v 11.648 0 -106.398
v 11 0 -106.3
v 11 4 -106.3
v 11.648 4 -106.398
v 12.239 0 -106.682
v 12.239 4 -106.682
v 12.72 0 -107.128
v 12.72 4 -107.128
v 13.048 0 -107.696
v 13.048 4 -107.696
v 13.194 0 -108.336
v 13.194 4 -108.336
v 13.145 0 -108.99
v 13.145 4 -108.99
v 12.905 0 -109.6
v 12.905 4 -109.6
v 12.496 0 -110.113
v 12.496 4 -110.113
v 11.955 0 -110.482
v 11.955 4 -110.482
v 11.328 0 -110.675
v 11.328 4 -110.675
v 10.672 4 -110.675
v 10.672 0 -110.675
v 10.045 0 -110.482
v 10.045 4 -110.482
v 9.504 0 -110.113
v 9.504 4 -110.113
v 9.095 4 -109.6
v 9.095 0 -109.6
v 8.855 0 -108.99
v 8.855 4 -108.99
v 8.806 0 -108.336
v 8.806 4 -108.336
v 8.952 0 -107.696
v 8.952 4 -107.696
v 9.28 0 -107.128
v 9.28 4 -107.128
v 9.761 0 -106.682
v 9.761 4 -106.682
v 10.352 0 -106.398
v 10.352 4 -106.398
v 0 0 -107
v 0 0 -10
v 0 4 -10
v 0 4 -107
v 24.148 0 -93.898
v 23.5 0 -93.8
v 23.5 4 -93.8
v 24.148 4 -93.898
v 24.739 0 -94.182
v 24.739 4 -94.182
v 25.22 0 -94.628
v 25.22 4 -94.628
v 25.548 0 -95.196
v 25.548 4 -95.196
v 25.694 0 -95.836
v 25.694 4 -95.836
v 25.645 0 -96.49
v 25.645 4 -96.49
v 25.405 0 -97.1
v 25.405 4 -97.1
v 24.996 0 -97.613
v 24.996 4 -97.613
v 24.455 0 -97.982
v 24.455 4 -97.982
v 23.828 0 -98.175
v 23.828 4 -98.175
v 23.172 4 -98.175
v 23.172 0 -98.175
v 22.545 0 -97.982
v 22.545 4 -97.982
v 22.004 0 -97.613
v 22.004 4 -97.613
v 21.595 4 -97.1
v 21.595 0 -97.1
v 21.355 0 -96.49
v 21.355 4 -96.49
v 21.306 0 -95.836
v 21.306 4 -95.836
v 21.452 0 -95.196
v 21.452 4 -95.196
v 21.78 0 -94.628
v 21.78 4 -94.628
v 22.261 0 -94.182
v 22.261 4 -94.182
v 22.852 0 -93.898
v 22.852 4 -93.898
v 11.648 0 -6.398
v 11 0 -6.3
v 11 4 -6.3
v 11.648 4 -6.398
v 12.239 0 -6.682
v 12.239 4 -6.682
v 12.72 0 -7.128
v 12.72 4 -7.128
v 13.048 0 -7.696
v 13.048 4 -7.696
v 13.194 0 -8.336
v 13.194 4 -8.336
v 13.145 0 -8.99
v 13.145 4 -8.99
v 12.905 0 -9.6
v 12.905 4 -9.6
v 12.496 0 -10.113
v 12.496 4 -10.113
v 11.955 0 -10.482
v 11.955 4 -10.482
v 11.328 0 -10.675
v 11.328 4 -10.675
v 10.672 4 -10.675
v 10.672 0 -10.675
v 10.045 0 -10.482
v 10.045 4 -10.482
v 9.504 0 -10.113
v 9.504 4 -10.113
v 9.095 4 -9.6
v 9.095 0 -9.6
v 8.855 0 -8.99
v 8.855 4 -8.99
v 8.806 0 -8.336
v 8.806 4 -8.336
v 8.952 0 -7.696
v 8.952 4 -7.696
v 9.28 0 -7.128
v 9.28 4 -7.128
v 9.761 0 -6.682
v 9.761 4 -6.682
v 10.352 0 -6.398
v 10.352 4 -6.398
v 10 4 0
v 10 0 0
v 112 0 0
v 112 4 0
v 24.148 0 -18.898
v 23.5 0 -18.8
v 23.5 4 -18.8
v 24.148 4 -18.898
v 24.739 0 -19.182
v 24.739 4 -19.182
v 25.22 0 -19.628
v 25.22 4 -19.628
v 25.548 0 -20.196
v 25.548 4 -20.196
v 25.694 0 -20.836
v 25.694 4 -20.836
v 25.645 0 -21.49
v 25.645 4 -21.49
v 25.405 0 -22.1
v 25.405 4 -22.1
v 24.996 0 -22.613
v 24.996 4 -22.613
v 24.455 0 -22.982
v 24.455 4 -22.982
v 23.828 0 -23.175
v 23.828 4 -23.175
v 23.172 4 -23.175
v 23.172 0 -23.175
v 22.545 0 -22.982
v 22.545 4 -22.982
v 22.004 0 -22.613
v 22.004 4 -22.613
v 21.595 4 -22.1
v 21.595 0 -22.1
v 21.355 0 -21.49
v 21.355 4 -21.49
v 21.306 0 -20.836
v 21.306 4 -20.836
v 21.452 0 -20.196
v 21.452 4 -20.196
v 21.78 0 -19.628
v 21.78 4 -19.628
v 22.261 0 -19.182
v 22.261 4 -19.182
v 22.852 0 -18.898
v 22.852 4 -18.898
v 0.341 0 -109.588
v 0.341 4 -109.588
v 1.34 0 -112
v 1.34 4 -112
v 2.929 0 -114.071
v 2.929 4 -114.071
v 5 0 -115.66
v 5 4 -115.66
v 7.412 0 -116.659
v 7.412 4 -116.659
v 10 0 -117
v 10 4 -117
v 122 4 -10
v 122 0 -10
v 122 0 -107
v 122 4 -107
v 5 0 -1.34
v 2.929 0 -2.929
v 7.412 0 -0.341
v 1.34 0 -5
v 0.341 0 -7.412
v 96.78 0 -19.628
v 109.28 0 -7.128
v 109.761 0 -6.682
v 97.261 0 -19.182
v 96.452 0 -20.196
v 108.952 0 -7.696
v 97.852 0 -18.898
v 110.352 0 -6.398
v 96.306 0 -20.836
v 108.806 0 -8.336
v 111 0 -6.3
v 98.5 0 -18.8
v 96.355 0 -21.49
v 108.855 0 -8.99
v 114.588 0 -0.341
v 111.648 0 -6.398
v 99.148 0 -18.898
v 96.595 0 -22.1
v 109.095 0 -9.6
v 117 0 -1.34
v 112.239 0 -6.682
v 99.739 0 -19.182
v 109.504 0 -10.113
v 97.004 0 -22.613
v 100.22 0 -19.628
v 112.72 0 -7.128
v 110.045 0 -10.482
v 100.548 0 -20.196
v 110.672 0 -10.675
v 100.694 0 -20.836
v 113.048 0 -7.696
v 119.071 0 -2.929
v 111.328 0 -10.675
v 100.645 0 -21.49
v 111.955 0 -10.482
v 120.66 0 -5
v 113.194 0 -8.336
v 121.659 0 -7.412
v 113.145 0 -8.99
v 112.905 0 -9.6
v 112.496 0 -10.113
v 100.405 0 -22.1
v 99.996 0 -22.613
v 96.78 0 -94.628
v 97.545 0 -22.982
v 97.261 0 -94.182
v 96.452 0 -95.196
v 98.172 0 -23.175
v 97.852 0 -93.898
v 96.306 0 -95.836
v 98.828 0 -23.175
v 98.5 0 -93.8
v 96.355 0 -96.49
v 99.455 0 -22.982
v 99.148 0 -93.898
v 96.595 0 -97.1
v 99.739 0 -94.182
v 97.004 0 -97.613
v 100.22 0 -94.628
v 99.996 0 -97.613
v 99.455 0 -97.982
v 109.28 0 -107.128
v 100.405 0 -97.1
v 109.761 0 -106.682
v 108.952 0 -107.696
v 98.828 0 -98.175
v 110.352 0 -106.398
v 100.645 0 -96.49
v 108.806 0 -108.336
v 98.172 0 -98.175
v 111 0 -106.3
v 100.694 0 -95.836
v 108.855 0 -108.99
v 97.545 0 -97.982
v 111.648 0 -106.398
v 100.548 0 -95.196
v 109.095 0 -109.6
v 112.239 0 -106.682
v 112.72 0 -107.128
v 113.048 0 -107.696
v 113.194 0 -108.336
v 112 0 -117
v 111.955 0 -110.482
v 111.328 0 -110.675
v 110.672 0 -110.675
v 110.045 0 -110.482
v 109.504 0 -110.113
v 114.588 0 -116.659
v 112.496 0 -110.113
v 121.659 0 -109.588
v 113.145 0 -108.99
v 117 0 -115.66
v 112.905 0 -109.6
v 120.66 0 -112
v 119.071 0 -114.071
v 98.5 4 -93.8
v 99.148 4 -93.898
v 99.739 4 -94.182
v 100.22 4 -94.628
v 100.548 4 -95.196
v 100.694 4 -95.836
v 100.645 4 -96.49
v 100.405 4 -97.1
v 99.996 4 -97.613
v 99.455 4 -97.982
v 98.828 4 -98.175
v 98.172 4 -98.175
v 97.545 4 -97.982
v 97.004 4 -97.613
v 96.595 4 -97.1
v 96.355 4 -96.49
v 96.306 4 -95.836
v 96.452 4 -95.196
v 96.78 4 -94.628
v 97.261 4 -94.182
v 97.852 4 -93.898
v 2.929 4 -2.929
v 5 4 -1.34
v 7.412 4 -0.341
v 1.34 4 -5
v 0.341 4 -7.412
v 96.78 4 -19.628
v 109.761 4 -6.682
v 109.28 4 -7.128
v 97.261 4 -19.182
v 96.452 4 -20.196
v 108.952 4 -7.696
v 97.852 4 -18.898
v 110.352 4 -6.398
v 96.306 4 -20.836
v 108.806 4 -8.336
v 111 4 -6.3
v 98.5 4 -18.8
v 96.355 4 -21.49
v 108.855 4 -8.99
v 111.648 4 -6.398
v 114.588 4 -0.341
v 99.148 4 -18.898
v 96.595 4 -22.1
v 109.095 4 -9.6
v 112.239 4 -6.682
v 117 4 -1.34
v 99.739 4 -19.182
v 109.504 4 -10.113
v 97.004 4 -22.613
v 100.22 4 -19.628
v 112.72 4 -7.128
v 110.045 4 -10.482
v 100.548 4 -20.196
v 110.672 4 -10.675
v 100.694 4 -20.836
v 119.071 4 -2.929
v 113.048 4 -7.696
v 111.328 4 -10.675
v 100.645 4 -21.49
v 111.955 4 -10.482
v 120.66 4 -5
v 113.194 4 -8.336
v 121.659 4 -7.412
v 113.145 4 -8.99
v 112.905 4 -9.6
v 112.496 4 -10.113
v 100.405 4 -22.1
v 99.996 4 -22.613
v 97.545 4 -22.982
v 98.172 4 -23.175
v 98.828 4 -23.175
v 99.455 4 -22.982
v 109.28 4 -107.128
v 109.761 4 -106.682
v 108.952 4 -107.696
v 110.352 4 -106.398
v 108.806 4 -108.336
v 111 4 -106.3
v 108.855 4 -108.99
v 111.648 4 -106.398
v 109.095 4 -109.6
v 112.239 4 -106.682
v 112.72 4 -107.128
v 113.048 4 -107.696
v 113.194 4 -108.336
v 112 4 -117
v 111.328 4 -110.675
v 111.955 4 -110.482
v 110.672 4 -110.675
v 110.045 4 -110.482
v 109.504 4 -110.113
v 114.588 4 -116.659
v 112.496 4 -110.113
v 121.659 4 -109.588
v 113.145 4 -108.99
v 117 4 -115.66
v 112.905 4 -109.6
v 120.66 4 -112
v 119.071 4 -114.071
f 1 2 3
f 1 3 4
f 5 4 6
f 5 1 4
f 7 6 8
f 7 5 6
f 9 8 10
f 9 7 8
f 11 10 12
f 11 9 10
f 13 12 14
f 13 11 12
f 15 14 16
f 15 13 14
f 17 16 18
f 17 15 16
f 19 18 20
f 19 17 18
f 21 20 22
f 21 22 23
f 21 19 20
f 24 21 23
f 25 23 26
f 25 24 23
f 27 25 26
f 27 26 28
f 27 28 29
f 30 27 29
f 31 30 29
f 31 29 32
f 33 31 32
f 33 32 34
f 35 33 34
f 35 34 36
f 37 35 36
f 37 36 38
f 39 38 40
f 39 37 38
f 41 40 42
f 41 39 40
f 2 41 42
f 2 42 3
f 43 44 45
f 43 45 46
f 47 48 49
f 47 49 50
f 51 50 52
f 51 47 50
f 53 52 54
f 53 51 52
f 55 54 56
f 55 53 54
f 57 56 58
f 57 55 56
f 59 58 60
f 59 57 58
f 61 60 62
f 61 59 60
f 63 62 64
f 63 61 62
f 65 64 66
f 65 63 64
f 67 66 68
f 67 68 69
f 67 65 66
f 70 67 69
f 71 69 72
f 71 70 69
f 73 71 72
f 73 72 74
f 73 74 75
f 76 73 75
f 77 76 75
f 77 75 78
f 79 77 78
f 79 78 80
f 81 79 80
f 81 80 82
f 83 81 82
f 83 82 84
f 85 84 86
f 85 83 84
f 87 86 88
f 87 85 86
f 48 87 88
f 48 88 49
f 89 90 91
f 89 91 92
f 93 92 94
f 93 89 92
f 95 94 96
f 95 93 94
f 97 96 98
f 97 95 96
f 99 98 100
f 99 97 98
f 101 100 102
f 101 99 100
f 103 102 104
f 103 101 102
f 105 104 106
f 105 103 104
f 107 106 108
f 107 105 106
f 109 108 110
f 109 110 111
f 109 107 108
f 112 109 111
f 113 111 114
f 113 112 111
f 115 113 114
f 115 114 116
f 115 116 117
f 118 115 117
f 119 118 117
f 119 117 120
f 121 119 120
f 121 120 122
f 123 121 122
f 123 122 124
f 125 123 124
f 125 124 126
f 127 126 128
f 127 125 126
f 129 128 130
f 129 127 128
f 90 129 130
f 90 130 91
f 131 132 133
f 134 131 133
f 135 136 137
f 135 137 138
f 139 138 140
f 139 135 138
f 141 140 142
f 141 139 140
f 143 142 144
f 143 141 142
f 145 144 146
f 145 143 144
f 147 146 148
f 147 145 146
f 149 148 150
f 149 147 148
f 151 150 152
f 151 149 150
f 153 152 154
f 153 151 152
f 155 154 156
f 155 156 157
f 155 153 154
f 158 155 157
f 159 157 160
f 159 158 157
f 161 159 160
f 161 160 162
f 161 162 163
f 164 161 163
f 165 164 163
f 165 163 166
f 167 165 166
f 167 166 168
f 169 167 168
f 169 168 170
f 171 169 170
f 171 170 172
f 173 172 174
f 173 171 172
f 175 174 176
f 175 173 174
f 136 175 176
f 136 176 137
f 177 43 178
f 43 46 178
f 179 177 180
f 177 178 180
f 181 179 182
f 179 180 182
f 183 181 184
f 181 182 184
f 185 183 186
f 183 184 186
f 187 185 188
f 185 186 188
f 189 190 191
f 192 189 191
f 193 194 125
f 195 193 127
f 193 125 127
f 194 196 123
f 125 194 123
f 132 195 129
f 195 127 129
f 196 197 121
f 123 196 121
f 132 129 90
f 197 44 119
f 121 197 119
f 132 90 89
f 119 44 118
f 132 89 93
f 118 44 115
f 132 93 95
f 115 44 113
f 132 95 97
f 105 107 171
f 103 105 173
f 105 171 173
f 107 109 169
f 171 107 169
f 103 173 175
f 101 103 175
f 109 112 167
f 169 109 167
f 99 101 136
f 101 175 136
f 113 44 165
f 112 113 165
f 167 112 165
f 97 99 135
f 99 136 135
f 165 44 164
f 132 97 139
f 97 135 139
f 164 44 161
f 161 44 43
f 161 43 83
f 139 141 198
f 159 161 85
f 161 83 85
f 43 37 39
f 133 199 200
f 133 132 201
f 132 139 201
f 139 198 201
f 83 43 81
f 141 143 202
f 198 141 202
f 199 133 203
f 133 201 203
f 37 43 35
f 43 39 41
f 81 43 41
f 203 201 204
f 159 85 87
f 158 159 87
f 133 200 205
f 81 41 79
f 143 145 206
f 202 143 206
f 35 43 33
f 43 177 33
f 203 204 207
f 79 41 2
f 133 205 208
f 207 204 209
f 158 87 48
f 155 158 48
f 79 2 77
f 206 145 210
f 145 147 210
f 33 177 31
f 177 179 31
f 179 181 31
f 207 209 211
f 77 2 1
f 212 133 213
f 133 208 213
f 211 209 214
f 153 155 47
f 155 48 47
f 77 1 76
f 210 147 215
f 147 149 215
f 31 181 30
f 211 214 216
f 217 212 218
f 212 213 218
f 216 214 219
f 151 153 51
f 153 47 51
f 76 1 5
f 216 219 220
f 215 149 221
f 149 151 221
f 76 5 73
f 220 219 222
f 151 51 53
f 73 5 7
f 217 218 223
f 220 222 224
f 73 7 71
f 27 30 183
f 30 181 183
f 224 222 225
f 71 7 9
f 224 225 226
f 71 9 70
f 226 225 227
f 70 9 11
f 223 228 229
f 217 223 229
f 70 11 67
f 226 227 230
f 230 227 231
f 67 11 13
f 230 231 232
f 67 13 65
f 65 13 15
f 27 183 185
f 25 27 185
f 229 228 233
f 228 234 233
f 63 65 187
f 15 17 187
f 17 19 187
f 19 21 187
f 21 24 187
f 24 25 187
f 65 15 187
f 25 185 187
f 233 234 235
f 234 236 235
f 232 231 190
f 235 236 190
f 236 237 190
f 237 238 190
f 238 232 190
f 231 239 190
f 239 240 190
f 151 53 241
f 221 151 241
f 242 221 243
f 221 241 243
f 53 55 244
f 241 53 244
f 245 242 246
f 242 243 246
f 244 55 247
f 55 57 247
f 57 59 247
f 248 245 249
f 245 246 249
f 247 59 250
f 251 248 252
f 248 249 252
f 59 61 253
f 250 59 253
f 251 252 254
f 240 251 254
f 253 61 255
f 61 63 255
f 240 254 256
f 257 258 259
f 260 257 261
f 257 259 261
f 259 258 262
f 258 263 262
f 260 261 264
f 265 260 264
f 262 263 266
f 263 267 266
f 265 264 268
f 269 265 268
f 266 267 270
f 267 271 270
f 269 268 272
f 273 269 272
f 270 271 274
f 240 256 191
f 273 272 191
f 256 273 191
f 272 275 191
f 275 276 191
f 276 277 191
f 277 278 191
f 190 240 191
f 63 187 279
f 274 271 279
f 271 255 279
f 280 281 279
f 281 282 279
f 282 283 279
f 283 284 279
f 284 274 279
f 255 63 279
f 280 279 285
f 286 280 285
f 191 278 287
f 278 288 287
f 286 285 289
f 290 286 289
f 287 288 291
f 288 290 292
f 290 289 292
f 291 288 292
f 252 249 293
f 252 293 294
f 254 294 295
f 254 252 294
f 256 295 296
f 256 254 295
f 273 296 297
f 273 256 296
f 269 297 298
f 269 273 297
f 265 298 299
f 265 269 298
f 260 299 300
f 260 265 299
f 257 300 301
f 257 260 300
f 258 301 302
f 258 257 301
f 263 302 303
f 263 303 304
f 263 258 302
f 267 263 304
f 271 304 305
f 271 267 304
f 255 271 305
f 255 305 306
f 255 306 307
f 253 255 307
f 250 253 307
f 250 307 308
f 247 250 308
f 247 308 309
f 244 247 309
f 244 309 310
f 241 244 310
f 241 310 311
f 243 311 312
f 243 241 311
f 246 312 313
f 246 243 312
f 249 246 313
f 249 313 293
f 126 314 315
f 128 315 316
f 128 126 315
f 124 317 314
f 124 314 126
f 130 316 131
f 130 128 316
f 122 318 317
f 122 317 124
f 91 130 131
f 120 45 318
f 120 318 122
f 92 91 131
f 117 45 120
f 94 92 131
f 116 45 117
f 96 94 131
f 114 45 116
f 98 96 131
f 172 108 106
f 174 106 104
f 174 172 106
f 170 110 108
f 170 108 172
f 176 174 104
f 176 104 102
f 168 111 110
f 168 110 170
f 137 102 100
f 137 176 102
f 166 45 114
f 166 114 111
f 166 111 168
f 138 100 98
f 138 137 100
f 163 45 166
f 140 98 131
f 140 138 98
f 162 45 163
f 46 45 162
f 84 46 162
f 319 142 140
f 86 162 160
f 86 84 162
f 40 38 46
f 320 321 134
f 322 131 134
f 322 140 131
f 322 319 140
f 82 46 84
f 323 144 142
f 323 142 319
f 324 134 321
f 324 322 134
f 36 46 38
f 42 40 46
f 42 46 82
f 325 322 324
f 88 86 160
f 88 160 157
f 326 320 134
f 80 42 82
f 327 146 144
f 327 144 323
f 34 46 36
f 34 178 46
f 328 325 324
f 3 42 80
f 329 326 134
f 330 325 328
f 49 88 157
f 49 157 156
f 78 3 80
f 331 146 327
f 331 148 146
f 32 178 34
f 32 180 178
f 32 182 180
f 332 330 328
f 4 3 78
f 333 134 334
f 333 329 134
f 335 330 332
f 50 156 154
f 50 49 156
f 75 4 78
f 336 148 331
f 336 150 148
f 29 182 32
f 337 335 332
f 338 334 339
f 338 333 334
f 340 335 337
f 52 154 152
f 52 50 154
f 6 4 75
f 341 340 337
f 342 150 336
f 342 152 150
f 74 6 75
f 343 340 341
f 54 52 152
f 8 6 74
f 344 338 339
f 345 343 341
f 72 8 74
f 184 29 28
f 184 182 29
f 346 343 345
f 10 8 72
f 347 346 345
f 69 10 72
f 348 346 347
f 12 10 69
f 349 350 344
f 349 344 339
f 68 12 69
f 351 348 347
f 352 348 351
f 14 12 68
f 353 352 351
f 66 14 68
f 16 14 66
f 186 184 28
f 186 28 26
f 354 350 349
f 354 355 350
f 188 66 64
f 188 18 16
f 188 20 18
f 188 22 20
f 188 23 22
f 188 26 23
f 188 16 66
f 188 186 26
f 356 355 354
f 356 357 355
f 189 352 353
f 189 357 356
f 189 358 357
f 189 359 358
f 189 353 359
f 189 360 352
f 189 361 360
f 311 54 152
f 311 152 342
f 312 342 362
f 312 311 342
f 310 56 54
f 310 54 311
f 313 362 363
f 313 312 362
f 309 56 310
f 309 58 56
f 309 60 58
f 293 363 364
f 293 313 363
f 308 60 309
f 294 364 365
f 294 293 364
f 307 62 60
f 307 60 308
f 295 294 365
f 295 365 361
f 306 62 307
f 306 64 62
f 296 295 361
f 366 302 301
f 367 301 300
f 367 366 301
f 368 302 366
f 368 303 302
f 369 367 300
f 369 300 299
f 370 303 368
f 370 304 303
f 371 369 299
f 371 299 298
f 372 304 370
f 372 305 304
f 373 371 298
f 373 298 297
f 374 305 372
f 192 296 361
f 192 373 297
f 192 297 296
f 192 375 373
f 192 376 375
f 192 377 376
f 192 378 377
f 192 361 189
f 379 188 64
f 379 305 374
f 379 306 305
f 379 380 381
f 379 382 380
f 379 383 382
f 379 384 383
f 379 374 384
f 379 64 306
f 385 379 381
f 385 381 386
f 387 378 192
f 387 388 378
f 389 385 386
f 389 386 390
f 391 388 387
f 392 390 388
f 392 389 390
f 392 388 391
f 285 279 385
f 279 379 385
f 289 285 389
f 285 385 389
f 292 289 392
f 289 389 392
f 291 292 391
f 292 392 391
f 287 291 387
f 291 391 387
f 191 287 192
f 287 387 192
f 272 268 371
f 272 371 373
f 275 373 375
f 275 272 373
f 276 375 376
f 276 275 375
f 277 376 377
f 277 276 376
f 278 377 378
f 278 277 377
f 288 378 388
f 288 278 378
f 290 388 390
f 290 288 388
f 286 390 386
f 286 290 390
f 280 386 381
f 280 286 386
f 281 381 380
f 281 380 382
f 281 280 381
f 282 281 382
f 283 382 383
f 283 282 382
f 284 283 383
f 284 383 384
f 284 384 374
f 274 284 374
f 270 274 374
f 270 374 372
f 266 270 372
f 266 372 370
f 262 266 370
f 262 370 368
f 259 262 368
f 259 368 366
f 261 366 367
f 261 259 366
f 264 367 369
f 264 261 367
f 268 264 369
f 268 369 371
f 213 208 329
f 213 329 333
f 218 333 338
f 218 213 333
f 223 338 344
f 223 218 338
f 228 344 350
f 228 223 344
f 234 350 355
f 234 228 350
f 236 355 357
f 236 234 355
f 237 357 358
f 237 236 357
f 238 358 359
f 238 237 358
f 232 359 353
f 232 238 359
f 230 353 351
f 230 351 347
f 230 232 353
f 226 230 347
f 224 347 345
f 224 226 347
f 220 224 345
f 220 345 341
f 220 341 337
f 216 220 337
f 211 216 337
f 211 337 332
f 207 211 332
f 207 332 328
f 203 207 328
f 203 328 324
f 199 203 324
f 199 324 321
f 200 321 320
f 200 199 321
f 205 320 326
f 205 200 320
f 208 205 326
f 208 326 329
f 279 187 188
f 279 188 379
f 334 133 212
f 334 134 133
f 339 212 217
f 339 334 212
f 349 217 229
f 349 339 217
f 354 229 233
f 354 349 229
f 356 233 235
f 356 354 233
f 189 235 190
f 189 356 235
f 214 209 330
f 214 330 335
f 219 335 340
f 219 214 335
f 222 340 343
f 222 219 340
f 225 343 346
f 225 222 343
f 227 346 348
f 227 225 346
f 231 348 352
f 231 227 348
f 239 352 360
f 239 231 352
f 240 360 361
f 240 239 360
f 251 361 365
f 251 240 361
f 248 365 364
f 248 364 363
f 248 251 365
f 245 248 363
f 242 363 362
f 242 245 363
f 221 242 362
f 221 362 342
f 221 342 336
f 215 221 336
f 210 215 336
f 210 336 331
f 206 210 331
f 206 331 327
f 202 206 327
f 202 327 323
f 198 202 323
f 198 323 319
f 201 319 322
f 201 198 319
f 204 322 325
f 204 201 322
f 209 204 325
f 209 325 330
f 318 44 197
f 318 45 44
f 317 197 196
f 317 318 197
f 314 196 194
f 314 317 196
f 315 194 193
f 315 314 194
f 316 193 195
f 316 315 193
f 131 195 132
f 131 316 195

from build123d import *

# Parameters (mm, degrees)
SKETCH1_W           = 122
SKETCH1_H           = 117
SKETCH1_R           = 2.2
BOSS_EXTRUDE1_DEPTH = 4
FILLET1_R           = 10


with BuildPart() as part:
    # Sketch1 → Boss-Extrude1 (new body)
    with BuildSketch(Plane(origin=(0, 0, 0), x_dir=(1, 0, 0), z_dir=(0, 1, 0))):
        with Locations((61, 58.5)):
            Rectangle(SKETCH1_W, SKETCH1_H)
        with Locations(Location((111, 108.5, 0), (0, 0, 270))):
            Circle(SKETCH1_R, mode=Mode.SUBTRACT)
        with Locations(Location((11, 108.5, 0), (0, 0, 270))):
            Circle(SKETCH1_R, mode=Mode.SUBTRACT)
        with Locations(Location((11, 8.5, 0), (0, 0, 270))):
            Circle(SKETCH1_R, mode=Mode.SUBTRACT)
        with Locations(Location((111, 8.5, 0), (0, 0, 270))):
            Circle(SKETCH1_R, mode=Mode.SUBTRACT)
        with Locations(Location((98.5, 96, 0), (0, 0, 270))):
            Circle(SKETCH1_R, mode=Mode.SUBTRACT)
        with Locations(Location((23.5, 96, 0), (0, 0, 270))):
            Circle(SKETCH1_R, mode=Mode.SUBTRACT)
        with Locations(Location((23.5, 21, 0), (0, 0, 270))):
            Circle(SKETCH1_R, mode=Mode.SUBTRACT)
        with Locations(Location((98.5, 21, 0), (0, 0, 270))):
            Circle(SKETCH1_R, mode=Mode.SUBTRACT)
    extrude(amount=BOSS_EXTRUDE1_DEPTH)

    # Fillet1
    fillet1_edges = [part.edges().sort_by_distance(p)[0] for p in [
        (0, 2, -117),
        (122, 2, -117),
        (122, 2, 0),
        (0, 2, 0),
    ]]
    fillet(fillet1_edges, radius=FILLET1_R)


solid = part.part
